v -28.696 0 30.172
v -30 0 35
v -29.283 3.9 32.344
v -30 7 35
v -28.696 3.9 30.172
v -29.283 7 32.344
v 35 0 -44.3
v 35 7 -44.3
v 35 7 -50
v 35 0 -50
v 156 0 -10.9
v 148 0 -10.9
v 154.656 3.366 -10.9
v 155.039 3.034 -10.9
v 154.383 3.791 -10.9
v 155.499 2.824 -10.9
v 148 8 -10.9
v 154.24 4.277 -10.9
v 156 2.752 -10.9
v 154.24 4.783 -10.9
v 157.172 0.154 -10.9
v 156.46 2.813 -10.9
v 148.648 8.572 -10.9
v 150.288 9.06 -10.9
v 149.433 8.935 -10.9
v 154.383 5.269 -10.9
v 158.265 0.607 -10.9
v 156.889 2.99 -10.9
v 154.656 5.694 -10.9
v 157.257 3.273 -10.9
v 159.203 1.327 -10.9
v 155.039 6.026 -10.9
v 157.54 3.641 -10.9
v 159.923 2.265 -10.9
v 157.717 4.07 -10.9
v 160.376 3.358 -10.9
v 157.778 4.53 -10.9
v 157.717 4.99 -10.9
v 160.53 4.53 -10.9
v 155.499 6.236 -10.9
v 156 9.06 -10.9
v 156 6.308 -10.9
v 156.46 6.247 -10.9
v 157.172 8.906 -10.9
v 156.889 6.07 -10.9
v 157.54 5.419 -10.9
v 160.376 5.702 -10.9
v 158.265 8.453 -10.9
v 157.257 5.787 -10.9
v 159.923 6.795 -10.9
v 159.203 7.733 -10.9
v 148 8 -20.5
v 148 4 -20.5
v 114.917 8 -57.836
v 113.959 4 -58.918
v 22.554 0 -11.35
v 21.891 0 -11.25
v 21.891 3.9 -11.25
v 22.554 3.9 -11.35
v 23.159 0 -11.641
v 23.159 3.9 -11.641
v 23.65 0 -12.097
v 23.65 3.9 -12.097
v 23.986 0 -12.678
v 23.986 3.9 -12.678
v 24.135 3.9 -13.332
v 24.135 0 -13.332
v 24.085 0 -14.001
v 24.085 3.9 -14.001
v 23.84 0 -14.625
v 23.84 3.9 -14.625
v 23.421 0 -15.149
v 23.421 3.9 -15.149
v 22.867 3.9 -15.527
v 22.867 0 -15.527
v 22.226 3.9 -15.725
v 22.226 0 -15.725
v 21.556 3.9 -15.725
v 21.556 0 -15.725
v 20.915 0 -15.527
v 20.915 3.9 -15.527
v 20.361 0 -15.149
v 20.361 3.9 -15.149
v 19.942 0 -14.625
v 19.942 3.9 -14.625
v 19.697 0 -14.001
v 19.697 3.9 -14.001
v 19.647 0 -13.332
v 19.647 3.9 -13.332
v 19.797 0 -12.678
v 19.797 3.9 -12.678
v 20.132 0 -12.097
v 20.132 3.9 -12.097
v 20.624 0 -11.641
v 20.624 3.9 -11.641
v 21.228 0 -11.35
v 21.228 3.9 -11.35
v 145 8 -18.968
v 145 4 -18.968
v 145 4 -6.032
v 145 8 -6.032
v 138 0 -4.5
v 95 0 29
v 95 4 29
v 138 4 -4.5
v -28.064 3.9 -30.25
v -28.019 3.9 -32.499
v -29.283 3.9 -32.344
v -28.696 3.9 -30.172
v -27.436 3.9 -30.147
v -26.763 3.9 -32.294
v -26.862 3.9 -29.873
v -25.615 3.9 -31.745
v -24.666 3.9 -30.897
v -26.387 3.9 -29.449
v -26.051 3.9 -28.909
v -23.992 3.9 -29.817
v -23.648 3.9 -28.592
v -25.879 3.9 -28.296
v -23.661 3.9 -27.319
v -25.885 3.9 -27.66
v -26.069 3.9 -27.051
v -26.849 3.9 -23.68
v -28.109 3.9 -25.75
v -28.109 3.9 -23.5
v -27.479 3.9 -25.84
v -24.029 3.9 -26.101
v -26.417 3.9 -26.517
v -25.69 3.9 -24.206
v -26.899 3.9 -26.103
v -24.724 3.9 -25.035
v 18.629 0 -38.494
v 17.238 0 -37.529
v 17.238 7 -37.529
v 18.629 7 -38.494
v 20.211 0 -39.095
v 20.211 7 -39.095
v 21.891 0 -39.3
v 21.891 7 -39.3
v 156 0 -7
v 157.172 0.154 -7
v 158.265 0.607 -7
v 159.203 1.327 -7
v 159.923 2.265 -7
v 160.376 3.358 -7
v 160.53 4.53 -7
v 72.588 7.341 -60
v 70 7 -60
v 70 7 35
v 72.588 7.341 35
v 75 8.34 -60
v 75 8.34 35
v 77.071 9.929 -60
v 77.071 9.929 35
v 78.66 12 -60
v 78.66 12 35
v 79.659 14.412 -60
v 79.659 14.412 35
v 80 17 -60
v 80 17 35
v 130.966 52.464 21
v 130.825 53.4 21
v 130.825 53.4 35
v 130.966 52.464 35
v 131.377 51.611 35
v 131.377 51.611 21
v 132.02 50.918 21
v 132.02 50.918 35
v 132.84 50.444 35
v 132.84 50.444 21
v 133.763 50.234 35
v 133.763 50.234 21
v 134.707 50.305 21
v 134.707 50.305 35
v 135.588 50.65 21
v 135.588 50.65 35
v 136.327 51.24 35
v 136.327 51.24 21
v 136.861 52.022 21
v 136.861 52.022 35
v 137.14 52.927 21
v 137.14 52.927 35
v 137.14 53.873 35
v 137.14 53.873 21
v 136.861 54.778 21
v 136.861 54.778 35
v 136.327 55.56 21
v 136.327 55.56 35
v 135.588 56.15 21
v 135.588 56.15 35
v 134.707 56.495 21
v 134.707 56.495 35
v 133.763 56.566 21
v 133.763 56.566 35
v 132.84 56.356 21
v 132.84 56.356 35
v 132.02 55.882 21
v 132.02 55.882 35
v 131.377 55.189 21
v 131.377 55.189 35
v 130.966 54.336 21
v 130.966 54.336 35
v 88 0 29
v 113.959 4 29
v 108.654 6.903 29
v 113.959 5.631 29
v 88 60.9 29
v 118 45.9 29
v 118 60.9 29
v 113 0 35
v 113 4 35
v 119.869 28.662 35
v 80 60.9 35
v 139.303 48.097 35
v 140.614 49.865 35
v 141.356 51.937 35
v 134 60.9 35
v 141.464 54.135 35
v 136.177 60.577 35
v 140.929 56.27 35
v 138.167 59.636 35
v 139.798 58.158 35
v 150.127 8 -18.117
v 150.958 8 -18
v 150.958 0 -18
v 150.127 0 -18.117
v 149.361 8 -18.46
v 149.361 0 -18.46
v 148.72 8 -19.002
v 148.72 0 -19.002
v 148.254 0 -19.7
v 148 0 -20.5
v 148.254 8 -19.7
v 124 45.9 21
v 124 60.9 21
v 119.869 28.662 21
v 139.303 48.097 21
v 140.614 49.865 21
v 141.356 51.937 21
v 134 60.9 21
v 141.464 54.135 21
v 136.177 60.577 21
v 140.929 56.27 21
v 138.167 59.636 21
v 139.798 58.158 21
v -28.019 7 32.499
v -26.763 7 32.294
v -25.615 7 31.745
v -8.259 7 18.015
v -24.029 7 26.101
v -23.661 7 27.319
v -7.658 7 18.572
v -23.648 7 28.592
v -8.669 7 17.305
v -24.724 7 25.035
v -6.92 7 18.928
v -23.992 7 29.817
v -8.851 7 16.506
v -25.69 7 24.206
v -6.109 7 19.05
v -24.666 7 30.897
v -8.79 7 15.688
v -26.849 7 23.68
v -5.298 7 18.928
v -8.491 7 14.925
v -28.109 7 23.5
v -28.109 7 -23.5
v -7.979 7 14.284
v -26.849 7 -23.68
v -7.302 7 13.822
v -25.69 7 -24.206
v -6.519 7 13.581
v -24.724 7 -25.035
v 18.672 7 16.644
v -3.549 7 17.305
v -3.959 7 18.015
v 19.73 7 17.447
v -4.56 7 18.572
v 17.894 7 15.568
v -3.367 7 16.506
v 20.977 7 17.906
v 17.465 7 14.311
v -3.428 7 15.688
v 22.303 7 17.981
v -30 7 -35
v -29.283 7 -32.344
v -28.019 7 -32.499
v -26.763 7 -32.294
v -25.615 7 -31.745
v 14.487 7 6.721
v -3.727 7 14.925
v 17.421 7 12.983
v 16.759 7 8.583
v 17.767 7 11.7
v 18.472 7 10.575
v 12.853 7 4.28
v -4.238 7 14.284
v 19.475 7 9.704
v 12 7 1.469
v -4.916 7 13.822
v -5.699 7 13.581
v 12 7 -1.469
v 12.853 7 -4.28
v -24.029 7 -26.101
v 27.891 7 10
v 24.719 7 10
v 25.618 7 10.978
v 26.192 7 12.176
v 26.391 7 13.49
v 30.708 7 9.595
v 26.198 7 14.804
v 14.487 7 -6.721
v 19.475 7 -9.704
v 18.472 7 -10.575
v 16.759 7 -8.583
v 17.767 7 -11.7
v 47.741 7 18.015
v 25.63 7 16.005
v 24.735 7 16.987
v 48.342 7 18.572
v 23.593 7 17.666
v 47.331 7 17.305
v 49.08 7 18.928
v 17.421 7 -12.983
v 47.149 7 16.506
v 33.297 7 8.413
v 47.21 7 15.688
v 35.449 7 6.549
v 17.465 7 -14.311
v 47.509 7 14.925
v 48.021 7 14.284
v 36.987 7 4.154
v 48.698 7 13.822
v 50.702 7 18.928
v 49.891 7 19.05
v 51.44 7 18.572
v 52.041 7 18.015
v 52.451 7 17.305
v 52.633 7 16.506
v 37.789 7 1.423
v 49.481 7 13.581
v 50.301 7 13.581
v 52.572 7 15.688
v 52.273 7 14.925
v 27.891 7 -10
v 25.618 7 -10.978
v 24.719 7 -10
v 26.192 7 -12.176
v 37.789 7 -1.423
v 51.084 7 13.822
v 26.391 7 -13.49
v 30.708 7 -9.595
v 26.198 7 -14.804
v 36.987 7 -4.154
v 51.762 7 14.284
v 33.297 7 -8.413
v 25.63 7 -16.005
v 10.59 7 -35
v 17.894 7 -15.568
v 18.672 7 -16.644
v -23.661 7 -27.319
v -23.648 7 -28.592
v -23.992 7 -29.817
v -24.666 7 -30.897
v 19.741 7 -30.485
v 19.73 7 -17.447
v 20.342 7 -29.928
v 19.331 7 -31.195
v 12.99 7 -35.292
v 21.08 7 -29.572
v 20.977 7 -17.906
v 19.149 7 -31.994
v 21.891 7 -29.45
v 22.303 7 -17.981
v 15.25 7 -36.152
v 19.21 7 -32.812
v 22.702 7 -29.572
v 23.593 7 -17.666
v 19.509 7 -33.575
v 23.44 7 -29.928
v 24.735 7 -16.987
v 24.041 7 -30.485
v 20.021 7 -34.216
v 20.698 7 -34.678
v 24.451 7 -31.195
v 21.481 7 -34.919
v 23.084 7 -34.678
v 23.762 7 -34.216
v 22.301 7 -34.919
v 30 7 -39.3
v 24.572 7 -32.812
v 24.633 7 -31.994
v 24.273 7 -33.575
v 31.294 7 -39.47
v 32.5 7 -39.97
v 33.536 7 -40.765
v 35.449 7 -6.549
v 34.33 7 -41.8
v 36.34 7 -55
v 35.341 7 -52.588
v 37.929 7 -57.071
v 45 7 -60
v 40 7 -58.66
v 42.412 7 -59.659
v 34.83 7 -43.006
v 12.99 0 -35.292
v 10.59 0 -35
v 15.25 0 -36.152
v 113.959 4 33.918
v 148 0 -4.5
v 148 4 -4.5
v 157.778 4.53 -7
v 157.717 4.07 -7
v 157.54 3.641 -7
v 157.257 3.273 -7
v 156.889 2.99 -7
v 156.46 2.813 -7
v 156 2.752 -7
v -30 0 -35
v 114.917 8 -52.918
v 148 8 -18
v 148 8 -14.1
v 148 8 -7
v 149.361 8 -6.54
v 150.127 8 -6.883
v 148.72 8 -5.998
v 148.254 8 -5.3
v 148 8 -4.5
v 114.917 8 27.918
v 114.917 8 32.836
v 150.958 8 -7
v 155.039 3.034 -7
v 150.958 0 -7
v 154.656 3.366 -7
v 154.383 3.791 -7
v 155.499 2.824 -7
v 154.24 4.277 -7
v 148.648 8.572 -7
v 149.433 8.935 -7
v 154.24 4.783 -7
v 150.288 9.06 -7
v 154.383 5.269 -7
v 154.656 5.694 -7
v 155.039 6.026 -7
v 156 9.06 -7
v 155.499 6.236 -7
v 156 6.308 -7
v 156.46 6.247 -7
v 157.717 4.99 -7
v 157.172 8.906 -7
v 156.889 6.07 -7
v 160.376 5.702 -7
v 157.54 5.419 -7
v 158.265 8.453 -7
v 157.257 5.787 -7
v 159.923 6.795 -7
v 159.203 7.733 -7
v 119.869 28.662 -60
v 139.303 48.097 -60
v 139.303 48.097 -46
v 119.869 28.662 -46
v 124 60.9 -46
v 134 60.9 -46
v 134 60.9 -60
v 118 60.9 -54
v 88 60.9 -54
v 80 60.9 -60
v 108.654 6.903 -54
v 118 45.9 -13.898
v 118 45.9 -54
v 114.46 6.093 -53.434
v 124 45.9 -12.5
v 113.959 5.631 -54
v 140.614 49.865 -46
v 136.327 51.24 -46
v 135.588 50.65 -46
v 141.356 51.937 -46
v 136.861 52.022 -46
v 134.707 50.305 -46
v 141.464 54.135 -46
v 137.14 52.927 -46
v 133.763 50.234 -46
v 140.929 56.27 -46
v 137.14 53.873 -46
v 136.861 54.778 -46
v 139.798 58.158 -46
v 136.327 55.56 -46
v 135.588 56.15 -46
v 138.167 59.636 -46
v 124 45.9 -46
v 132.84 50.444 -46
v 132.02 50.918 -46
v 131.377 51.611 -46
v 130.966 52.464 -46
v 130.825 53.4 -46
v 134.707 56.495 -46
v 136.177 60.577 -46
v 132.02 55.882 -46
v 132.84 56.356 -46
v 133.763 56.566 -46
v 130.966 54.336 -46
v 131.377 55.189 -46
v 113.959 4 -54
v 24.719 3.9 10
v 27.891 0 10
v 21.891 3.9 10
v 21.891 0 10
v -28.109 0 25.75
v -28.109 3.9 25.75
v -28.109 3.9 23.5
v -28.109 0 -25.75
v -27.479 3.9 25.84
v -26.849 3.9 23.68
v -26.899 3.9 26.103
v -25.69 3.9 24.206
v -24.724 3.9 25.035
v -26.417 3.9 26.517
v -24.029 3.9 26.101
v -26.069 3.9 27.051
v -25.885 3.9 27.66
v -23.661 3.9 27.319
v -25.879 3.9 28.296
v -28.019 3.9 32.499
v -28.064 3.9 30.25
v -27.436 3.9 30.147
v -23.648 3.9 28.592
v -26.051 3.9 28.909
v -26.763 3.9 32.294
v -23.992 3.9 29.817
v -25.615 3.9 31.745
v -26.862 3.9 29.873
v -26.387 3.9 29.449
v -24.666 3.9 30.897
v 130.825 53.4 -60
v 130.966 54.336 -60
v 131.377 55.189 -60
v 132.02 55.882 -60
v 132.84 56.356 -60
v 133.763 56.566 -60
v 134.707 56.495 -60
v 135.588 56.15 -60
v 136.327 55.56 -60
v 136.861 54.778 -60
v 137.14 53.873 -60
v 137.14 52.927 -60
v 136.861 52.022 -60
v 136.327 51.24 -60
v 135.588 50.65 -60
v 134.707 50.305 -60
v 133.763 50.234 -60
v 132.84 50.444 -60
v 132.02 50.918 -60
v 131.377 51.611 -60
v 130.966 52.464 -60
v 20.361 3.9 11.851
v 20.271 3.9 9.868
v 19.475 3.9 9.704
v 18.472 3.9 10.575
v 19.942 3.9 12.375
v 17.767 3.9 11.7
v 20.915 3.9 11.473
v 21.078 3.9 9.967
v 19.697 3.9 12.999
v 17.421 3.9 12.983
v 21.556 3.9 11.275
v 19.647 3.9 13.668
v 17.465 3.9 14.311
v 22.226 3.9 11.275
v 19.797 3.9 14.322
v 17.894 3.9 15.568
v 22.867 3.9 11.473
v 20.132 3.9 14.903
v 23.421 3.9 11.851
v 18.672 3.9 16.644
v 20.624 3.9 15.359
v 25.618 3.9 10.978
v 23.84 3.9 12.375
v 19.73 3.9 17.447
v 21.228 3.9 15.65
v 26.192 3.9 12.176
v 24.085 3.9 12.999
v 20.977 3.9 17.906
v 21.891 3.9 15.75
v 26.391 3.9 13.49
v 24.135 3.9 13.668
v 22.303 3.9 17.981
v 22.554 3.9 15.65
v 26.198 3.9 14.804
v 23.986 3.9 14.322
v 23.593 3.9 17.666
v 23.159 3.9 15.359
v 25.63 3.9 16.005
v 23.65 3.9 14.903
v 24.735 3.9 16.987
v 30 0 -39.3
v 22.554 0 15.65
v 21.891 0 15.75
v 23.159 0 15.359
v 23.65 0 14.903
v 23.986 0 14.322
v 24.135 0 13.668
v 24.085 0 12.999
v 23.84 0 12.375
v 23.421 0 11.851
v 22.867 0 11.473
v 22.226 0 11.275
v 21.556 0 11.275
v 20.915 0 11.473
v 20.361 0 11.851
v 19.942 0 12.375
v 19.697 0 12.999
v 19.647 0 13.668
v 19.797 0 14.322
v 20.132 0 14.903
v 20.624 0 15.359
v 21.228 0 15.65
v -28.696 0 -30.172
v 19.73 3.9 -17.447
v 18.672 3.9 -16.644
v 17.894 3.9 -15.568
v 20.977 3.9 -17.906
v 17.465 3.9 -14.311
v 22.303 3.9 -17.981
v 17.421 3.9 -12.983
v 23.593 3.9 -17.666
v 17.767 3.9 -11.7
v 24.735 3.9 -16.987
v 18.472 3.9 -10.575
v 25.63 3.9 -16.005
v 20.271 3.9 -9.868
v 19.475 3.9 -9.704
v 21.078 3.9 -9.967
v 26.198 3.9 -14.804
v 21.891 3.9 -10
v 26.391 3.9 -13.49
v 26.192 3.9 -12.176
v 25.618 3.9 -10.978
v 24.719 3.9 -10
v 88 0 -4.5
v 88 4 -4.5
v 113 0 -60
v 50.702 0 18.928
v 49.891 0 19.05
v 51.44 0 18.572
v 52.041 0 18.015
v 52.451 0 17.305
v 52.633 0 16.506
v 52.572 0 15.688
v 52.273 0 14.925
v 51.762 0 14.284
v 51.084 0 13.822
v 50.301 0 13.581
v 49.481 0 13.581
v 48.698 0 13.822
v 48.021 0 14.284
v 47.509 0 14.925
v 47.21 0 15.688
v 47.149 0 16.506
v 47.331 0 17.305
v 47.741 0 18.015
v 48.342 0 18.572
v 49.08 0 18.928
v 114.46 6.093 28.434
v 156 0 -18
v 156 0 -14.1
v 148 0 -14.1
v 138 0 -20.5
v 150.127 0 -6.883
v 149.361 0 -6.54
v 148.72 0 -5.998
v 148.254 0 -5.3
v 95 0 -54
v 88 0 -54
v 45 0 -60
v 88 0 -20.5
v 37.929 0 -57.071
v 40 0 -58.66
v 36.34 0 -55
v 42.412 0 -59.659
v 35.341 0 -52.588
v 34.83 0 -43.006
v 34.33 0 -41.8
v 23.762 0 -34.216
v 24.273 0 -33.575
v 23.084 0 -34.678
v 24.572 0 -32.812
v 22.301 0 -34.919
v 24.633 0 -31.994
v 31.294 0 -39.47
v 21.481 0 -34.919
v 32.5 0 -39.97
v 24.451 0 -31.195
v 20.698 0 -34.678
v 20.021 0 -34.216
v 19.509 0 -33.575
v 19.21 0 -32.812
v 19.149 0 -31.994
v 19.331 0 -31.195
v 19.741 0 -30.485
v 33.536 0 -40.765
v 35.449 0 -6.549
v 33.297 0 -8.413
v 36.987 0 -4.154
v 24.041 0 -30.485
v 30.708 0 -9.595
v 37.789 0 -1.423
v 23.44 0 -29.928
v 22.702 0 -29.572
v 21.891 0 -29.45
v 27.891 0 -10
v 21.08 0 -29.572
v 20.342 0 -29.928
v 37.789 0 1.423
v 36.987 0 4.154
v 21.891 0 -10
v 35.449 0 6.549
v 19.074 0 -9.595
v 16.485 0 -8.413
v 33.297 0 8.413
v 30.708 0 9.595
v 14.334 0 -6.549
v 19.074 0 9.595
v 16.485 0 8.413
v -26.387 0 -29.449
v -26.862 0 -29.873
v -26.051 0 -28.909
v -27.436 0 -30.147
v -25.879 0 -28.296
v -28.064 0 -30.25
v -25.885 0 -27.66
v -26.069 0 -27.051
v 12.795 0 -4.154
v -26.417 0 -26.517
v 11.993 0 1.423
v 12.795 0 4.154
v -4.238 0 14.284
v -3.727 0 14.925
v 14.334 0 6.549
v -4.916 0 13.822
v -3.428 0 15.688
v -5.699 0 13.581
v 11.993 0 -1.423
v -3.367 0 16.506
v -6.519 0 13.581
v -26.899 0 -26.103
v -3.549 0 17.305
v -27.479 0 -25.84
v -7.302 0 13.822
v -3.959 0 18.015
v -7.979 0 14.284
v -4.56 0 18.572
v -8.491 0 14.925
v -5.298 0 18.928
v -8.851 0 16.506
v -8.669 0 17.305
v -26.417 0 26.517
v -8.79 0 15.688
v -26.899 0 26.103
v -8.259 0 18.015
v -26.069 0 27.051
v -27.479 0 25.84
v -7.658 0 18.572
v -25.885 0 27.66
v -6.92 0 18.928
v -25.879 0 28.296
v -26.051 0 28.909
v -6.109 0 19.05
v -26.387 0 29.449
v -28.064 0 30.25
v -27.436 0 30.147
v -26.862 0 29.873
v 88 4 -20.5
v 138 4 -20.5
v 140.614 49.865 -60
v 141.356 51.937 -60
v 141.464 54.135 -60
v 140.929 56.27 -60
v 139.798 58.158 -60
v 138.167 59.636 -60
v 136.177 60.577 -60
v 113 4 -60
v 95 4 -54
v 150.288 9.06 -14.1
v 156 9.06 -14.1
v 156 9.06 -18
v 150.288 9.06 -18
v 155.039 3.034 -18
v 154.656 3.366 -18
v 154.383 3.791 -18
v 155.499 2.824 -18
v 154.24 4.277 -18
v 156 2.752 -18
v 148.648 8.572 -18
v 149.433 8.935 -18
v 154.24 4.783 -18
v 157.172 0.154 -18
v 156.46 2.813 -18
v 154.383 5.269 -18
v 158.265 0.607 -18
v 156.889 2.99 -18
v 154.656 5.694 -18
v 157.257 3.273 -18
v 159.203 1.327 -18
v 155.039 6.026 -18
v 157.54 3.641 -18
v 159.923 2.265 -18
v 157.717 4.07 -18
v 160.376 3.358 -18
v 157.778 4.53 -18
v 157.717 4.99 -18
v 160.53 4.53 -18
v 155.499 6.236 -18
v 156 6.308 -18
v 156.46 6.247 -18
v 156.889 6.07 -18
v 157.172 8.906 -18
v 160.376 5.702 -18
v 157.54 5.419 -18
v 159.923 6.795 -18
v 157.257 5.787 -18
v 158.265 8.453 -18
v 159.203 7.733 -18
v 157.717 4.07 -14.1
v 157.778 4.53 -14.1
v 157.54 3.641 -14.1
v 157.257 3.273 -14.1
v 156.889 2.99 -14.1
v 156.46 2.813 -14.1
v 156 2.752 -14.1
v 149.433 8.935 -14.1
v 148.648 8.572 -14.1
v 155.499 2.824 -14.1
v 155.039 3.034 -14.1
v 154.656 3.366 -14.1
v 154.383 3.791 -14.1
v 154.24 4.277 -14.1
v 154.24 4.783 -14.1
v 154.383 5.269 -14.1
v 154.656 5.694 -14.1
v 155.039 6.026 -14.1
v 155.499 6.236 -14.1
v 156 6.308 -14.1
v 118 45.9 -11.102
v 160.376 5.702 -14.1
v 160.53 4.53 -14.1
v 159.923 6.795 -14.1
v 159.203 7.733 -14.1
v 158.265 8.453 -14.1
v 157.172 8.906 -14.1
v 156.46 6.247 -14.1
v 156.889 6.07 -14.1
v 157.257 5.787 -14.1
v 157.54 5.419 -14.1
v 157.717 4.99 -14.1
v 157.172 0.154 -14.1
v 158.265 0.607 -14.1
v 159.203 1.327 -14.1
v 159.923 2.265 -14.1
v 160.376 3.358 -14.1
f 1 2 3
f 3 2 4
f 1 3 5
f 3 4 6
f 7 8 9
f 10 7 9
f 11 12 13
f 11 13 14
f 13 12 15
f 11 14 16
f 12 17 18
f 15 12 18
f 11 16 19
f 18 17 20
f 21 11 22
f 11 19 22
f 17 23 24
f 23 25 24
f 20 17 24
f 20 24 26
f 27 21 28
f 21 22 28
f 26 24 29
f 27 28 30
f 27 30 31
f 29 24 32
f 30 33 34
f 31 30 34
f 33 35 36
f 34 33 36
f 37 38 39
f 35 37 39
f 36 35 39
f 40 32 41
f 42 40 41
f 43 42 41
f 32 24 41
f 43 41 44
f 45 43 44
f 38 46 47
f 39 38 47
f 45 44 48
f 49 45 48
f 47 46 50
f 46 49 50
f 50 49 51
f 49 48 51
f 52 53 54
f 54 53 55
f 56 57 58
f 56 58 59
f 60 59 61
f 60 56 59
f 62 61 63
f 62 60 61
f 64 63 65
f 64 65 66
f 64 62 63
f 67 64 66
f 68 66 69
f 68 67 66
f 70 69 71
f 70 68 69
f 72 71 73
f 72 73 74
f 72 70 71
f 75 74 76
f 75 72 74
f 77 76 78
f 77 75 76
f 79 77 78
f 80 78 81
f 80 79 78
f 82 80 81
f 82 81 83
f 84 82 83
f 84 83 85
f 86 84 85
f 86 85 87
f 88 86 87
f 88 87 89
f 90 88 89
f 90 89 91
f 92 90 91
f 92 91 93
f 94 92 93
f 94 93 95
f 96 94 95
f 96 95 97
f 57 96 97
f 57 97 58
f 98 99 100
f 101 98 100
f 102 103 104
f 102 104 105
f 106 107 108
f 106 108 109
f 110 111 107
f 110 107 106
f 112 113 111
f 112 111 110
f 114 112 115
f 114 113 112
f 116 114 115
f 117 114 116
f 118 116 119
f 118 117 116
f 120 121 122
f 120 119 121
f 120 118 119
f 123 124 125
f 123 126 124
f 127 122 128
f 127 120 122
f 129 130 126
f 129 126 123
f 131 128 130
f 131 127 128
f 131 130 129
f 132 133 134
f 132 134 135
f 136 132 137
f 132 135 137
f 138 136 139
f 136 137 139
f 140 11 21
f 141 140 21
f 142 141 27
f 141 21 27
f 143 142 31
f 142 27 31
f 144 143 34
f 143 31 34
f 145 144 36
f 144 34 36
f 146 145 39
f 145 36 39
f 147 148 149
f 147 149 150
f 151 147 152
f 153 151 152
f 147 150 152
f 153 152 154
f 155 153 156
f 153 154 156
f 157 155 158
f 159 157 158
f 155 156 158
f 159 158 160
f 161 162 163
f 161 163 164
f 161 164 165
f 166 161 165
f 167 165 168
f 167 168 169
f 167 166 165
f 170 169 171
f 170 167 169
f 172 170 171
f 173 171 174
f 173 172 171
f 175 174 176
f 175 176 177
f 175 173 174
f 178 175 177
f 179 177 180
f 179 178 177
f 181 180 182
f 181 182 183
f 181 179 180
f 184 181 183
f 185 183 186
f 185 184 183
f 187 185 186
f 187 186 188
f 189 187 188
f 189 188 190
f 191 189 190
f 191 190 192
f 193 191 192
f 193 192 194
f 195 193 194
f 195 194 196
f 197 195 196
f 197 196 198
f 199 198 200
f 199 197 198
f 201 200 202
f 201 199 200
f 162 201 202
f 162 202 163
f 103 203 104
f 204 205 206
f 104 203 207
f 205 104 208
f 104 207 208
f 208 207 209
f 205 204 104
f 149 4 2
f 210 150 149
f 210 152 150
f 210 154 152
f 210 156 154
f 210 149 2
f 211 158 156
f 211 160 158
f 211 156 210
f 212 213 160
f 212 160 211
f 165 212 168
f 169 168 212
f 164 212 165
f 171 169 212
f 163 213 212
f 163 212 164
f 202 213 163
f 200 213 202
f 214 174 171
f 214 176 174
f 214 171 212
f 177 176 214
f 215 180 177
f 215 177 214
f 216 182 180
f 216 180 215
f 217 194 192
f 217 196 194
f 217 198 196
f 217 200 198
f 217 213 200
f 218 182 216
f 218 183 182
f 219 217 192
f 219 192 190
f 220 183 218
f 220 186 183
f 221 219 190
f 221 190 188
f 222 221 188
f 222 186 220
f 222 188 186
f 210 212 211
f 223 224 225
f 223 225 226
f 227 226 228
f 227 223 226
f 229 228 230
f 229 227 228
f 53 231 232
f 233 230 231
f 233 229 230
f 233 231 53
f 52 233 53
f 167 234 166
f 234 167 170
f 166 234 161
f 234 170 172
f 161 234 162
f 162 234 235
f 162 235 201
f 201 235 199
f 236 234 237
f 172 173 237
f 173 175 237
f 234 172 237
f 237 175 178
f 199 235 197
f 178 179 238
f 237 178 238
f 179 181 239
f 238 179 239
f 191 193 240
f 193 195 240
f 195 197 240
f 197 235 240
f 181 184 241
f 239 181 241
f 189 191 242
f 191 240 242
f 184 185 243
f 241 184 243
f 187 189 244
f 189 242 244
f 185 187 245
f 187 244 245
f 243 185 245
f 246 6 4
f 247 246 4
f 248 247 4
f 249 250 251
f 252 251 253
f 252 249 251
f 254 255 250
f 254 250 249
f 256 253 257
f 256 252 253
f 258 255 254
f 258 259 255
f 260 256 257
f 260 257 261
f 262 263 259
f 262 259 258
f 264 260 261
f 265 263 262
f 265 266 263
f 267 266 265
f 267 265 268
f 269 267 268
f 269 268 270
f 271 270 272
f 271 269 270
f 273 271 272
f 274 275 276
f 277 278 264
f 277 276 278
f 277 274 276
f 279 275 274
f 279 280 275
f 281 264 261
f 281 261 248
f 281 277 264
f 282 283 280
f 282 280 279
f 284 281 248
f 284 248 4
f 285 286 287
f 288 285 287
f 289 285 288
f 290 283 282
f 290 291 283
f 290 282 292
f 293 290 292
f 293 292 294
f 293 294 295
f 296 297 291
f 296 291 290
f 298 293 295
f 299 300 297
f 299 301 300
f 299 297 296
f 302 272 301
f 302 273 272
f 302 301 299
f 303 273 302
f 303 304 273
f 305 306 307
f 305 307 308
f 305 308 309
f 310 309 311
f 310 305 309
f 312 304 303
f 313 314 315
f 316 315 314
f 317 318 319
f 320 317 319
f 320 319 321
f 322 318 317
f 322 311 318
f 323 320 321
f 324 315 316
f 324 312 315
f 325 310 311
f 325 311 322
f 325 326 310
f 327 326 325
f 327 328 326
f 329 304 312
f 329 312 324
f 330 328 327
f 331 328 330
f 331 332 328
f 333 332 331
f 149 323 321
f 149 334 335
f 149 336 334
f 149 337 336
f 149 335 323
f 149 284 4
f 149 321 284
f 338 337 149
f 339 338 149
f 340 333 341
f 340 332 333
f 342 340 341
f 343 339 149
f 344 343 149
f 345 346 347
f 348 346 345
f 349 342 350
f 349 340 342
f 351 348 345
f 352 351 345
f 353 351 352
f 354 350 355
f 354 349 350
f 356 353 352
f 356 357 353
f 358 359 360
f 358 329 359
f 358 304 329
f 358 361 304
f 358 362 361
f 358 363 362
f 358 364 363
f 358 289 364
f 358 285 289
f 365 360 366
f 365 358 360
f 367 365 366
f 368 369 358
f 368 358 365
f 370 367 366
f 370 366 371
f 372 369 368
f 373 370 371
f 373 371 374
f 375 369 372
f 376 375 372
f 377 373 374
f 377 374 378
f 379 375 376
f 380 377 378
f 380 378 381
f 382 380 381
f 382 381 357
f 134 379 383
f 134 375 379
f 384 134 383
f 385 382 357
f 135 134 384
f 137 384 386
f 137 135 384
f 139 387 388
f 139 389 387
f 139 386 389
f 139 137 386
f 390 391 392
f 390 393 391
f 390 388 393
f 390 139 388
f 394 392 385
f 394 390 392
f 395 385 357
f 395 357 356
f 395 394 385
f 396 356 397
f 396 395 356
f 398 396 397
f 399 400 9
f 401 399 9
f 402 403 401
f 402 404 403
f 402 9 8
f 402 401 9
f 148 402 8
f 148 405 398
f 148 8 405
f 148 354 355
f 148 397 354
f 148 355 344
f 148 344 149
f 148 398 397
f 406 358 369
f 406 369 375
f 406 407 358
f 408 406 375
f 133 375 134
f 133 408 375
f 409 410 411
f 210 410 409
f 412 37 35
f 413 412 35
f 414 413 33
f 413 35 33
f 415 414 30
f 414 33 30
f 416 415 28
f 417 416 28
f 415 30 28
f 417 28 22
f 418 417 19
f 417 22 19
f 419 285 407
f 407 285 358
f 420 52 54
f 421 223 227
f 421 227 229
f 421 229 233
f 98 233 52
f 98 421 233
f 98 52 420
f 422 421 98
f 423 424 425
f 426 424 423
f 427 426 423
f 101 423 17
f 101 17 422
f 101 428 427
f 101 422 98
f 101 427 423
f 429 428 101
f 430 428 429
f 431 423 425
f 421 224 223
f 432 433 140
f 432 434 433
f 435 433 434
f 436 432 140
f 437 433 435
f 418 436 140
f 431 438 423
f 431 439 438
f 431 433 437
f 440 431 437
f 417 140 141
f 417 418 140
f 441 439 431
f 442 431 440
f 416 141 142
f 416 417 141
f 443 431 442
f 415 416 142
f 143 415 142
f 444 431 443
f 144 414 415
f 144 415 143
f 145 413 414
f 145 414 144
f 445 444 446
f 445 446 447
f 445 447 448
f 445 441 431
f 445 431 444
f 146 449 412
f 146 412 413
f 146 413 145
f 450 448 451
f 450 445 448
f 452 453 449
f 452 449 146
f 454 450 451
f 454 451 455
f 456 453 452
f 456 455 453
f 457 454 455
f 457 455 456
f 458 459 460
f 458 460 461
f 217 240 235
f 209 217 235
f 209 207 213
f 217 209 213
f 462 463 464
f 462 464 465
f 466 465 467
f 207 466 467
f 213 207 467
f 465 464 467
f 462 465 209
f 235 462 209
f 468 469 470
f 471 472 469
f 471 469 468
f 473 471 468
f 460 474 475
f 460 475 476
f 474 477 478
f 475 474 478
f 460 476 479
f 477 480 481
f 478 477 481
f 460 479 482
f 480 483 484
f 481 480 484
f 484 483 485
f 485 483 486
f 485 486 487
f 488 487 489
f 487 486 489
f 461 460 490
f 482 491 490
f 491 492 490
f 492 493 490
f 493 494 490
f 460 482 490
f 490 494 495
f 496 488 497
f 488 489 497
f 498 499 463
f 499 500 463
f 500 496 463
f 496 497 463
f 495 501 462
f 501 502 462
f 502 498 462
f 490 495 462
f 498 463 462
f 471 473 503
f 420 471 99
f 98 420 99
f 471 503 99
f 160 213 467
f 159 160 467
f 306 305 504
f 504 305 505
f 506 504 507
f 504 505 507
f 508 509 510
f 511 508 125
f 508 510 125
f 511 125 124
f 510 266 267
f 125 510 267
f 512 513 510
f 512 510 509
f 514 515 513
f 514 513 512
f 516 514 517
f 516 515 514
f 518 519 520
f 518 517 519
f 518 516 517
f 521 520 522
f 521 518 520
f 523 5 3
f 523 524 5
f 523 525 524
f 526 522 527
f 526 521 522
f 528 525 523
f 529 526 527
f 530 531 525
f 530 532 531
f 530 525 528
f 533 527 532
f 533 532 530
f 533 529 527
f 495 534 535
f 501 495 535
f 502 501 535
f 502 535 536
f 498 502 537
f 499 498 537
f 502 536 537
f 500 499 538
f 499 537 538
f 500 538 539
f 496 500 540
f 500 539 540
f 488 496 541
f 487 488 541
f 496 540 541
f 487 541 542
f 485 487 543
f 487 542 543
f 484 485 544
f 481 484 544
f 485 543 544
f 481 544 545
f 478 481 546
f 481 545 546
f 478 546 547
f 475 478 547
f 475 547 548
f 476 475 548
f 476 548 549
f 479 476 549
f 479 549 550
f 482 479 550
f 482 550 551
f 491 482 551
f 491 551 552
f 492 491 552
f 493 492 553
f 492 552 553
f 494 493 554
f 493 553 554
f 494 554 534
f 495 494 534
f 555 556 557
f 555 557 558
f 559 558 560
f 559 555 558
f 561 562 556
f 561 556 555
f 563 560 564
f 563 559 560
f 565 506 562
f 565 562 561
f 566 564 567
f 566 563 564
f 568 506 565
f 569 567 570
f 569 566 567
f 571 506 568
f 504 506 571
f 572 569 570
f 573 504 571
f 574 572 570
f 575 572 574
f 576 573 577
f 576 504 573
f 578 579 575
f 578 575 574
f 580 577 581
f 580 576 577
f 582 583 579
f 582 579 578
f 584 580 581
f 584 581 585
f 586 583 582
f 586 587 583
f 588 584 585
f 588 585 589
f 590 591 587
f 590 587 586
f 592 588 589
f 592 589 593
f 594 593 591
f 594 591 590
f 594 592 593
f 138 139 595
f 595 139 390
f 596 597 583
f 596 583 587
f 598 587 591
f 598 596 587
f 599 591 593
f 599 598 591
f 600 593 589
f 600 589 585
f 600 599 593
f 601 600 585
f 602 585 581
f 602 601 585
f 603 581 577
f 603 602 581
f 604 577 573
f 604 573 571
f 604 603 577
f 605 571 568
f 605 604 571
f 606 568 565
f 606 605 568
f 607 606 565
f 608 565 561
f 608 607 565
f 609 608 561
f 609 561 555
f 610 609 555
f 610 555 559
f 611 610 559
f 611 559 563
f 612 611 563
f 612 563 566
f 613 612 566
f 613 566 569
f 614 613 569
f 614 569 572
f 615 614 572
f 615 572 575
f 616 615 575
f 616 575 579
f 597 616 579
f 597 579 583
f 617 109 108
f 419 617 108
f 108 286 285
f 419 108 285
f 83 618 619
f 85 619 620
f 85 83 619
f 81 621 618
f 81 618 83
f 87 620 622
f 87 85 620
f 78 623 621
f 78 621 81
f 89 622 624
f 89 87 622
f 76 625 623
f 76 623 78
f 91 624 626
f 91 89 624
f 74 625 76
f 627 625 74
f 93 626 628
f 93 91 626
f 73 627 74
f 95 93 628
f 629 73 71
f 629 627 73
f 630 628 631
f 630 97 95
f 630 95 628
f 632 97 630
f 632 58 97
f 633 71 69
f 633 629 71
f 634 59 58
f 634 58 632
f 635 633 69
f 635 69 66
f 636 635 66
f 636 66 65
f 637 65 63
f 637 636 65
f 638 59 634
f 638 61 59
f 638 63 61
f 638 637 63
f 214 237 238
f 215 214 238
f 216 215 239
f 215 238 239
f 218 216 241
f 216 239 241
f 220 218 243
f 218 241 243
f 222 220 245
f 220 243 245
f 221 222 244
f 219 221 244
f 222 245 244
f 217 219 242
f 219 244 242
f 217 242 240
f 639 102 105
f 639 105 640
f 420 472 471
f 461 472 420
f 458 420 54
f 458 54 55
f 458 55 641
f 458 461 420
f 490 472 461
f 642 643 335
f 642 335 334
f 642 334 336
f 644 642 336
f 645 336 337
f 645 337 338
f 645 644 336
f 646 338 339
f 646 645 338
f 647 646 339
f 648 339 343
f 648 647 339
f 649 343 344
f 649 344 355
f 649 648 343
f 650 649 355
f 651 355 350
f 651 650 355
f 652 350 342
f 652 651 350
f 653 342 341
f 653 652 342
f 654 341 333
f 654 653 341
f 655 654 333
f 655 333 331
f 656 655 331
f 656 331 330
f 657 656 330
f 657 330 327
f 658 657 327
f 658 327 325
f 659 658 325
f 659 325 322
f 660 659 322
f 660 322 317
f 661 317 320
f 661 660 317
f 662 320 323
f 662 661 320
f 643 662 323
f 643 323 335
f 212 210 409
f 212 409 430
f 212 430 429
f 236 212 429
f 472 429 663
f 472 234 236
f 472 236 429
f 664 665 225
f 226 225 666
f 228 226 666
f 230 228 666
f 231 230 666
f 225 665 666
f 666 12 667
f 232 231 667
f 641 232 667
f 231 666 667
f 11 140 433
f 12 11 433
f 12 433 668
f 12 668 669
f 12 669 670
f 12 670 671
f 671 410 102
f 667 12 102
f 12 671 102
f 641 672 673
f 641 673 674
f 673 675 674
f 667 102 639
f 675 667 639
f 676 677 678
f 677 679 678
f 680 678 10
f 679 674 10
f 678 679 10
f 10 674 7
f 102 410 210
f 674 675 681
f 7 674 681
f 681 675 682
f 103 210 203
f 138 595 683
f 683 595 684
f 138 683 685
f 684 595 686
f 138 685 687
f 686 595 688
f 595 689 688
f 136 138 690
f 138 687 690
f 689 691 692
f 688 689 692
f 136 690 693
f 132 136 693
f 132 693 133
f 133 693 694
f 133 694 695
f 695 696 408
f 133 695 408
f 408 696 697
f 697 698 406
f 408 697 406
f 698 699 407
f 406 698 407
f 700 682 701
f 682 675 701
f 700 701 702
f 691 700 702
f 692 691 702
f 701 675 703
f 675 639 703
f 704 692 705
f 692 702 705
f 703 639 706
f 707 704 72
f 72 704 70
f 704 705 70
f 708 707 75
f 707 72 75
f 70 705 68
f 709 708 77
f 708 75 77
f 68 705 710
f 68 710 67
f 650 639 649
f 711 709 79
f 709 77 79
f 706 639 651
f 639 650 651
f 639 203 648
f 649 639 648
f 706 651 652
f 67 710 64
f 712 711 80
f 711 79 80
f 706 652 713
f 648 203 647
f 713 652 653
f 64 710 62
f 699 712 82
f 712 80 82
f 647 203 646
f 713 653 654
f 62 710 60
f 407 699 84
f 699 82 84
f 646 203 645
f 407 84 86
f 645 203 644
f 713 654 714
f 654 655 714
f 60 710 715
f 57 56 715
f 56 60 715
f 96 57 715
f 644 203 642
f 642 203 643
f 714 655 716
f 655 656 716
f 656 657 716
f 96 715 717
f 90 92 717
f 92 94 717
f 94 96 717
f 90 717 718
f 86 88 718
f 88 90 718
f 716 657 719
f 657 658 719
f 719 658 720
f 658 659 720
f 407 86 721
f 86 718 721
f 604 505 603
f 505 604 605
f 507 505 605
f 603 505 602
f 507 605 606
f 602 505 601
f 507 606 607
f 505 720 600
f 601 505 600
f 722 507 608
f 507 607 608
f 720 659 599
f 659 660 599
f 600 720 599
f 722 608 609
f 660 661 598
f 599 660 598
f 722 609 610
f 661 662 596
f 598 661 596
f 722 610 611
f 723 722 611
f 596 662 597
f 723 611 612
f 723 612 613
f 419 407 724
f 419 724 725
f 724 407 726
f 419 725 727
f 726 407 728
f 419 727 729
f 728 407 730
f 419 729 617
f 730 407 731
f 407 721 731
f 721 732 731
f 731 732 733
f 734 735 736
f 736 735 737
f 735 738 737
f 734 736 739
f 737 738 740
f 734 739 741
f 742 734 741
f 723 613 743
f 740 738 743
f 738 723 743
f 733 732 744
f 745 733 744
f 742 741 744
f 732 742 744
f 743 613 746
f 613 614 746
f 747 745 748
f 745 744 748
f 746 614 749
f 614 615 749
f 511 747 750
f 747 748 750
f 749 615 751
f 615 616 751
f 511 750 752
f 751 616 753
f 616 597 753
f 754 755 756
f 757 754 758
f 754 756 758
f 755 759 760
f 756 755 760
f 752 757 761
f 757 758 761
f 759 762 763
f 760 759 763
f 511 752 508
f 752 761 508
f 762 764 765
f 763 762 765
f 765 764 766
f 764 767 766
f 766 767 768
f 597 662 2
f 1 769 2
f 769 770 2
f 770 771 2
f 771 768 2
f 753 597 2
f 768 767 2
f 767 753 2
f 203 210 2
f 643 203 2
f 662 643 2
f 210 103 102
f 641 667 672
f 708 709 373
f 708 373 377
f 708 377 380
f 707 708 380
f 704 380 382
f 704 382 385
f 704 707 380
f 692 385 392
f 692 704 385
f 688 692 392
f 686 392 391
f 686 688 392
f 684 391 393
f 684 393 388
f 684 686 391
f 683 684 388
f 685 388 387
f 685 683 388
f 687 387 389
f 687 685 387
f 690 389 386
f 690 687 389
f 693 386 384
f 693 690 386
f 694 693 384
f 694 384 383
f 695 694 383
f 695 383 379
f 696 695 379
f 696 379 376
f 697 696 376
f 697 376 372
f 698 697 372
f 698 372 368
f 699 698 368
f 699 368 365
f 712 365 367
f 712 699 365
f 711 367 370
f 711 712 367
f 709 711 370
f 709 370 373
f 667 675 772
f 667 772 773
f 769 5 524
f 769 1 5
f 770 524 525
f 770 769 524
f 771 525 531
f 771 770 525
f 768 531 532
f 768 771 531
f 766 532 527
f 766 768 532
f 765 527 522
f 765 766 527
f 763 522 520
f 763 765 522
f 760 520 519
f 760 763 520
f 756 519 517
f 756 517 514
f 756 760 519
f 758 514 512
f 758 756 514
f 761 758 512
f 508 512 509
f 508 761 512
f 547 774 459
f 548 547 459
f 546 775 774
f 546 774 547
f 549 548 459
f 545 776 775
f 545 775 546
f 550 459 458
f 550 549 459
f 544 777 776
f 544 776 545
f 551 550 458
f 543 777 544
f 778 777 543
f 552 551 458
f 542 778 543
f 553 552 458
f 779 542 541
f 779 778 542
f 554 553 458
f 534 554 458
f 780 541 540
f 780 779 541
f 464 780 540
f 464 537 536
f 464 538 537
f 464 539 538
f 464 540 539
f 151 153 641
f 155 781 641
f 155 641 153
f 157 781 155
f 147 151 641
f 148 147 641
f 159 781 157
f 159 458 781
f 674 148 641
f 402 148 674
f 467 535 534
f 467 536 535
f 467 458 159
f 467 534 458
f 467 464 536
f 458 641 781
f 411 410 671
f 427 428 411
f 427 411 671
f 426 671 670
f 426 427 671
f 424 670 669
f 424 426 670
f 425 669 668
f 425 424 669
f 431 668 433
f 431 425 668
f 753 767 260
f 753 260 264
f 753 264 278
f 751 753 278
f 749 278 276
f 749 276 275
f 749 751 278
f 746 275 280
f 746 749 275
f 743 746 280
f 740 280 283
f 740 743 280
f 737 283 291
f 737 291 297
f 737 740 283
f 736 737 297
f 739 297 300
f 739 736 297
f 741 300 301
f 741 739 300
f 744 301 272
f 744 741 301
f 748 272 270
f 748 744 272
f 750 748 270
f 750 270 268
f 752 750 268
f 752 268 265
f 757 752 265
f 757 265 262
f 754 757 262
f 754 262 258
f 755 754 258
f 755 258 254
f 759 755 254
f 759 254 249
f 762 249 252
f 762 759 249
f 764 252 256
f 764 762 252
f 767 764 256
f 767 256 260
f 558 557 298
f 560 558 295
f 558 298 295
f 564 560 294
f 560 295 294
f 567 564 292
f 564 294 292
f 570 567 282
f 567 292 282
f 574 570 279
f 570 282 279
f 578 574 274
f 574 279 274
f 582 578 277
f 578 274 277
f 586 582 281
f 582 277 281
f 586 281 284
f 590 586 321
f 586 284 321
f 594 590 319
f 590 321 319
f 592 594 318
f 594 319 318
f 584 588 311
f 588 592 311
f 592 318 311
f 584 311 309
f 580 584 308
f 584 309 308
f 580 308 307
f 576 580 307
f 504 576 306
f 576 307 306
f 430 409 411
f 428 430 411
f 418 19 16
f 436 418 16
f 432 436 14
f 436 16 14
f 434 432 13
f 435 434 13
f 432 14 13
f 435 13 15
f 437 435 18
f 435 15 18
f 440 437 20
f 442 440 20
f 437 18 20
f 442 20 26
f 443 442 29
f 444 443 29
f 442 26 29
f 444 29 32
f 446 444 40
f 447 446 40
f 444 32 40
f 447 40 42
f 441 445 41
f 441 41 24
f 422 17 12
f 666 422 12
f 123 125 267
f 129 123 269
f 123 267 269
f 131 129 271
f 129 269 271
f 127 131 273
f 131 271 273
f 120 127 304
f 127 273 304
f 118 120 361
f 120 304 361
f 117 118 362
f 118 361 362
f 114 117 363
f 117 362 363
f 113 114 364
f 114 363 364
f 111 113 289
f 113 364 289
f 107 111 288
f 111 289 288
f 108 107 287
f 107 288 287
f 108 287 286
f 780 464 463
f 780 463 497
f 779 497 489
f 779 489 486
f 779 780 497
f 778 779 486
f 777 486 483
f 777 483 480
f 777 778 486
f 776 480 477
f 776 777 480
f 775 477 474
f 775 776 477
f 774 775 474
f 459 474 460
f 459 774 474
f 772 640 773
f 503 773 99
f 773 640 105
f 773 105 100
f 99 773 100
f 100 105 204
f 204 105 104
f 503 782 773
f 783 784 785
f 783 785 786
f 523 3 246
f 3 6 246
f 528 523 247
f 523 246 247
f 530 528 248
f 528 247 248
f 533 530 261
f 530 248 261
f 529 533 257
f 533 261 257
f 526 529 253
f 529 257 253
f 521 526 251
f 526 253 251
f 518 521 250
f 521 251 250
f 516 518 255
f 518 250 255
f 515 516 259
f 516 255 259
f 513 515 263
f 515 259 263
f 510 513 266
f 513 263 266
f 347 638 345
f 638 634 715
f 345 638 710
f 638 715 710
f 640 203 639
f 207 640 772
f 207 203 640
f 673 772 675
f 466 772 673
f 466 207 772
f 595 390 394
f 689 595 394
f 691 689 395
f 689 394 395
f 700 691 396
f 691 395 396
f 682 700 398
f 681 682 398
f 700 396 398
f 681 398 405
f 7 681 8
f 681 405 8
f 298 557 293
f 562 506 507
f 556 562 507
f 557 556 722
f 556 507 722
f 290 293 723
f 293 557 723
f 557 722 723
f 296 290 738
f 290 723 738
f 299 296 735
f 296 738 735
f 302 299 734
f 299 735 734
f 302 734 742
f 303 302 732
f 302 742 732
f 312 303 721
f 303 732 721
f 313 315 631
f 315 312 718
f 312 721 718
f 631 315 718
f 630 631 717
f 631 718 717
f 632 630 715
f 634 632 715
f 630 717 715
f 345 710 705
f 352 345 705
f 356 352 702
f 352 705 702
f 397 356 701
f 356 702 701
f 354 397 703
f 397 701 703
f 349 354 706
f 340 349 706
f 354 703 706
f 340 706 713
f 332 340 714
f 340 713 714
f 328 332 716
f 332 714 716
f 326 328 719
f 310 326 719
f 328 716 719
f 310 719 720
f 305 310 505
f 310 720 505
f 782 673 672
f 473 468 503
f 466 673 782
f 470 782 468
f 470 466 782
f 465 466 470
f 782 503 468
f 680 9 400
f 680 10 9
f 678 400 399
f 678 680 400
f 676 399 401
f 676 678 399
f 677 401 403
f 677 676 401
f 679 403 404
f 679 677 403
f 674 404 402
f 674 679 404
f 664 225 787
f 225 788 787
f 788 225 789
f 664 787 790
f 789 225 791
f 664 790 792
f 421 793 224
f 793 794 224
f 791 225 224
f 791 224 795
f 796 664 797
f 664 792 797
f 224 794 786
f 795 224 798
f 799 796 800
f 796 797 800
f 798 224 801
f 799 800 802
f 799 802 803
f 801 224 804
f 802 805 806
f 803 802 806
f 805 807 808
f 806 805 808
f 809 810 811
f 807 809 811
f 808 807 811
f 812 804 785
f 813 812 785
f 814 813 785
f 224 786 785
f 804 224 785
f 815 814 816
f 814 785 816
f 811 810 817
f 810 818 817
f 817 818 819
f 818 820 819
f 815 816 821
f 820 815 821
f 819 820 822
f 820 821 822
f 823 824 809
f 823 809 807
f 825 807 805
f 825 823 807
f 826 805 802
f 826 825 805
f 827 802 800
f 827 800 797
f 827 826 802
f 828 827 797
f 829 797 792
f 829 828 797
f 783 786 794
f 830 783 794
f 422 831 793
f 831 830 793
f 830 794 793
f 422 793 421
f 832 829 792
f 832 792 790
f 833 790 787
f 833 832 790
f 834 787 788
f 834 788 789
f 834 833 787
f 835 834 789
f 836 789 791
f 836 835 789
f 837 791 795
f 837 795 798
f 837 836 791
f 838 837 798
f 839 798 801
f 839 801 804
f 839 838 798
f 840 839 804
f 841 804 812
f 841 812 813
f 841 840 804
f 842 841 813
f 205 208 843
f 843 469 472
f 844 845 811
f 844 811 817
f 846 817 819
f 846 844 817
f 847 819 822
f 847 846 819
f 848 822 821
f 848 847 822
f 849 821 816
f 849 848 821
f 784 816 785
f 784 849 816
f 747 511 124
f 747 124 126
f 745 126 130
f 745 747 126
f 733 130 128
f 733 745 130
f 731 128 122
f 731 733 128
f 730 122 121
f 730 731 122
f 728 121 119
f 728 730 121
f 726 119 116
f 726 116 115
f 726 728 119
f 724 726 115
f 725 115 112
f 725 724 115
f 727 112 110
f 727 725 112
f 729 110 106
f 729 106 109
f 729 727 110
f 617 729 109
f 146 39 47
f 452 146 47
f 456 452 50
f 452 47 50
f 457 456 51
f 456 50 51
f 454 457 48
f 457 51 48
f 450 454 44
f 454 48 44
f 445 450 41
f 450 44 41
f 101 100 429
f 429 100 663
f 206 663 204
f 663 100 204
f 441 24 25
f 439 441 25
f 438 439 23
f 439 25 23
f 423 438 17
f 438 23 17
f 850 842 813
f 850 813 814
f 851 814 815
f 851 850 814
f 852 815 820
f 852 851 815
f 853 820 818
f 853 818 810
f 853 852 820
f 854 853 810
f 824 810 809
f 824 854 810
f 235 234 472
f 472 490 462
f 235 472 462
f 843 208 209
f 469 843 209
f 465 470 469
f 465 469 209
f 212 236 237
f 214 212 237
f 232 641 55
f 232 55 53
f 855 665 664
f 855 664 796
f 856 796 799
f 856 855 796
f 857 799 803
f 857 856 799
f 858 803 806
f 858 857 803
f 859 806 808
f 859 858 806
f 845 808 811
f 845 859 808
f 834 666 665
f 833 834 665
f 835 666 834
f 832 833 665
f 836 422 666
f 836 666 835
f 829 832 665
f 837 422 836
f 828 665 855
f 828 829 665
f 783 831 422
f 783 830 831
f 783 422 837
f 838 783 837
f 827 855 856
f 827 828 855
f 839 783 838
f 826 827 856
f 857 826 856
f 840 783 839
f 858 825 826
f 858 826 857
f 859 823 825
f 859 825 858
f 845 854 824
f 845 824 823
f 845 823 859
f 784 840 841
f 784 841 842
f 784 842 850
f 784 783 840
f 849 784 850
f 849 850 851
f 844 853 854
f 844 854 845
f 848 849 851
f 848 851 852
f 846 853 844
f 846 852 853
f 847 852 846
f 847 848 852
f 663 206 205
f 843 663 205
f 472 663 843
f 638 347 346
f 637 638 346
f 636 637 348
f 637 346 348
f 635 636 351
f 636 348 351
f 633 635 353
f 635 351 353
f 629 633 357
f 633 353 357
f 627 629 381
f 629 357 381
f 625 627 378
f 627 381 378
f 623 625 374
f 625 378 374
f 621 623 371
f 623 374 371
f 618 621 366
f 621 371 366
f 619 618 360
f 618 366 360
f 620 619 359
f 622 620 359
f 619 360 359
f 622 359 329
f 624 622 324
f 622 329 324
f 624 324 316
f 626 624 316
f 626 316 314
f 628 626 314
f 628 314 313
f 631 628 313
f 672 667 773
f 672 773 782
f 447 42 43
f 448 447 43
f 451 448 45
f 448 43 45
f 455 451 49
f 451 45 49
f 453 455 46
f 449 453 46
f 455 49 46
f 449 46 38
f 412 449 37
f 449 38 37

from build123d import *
from build123d.topology import SkipClean

# Parameters (mm, degrees)
SKETCH1_W                                        = 115
SKETCH1_H                                        = 95
EXTRUDE1_DEPTH                                   = 7
SKETCH2_R                                        = 2.75
SKETCH2_R_2                                      = 2.25
EXTRUDE7_DEPTH                                   = 7
CBORE_FOR_M4_PAN_HEAD_MACHINE_SCREW2_D           = 4.5
CBORE_FOR_M4_PAN_HEAD_MACHINE_SCREW2_CBORE_D     = 9
CBORE_FOR_M4_PAN_HEAD_MACHINE_SCREW2_CBORE_DEPTH = 3.1
EXTRUDE9_DEPTH                                   = 101.244700608
FILLET1_R                                        = 10
SKETCH19_W                                       = 95
SKETCH19_H                                       = 60.9
BOSS_EXTRUDE1_DEPTH                              = 8
BOSS_EXTRUDE2_DEPTH                              = 6
BOSS_EXTRUDE3_DEPTH                              = 6
SKETCH22_W                                       = 6
SKETCH22_H                                       = 15
BOSS_EXTRUDE4_DEPTH                              = 83
BOSS_EXTRUDE5_DEPTH                              = 5.834785
SKETCH25_R                                       = 3.175
BOSS_EXTRUDE6_DEPTH                              = 14
BOSS_EXTRUDE7_START                              = -14
SKETCH26_R                                       = 3.175
BOSS_EXTRUDE7_DEPTH                              = 14
FILLET2_R                                        = 10
BOSS_EXTRUDE8_DEPTH                              = 4
BOSS_EXTRUDE9_DEPTH                              = 4
BOSS_EXTRUDE10_DEPTH                             = 5.5
CUT_EXTRUDE1_DEPTH                               = 1.6
FILLET3_R                                        = 3


with BuildPart() as part:
    # Sketch1 → Extrude1 (new body)
    with BuildSketch(Plane(origin=(0, 0, 0), x_dir=(1, 0, 0), z_dir=(0, 1, 0))):
        with Locations((22.5, 12.5)):
            Rectangle(SKETCH1_W, SKETCH1_H)
    extrude(amount=EXTRUDE1_DEPTH)

    # Sketch2 → Extrude7 (cut)
    with BuildSketch(Plane(origin=(0, 0, 0), x_dir=(1, 0, 0), z_dir=(0, 1, 0))):
        with Locations(Location((-6.108955811, -16.3, 0), (0, 0, 270))):
            Circle(SKETCH2_R)
        with Locations(Location((49.891044189, -16.3, 0), (0, 0, 270))):
            Circle(SKETCH2_R)
        with Locations(Location((-28.108955811, -28, 0), (0, 0, 270))):
            Circle(SKETCH2_R_2)
        with Locations(Location((-28.108955811, 28, 0), (0, 0, 270))):
            Circle(SKETCH2_R_2)
        with Locations(Location((21.891044189, 32.2, 0), (0, 0, 270))):
            Circle(SKETCH2_R)
        with Locations(Location((21.891044189, -13.5, 0), (0, 0, 270))):
            Circle(SKETCH2_R_2)
        with Locations(Location((21.891044189, 13.5, 0), (0, 0, 270))):
            Circle(SKETCH2_R_2)
        with BuildLine():
            Line((21.891044189, 10), (27.891044189, 10))
            ThreePointArc((27.891044189, 10), (37.891044189, 0), (27.891044189, -10))
            Line((27.891044189, -10), (21.891044189, -10))
            ThreePointArc((21.891044189, -10), (11.891044189, 0), (21.891044189, 10))
        make_face()
    extrude(amount=EXTRUDE7_DEPTH, mode=Mode.SUBTRACT)

    # CBORE for M4 Pan Head Machine Screw2 (through all)
    with Locations(Plane(origin=(-28.108955811, 7, -28), x_dir=(0, 0, 1), z_dir=(0, 1, 0))):
        with Locations((0, 0), (14.5, 50), (41.5, 50), (56, 0)):
            CounterBoreHole(CBORE_FOR_M4_PAN_HEAD_MACHINE_SCREW2_D / 2, CBORE_FOR_M4_PAN_HEAD_MACHINE_SCREW2_CBORE_D / 2, CBORE_FOR_M4_PAN_HEAD_MACHINE_SCREW2_CBORE_DEPTH)

    # Sketch18 → Extrude9 (cut, through all)
    with BuildSketch(Plane(origin=(0, 7, 0), x_dir=(1, 0, 0), z_dir=(0, 1, 0))):
        with BuildLine():
            Line((21.891044189, 39.300103485), (30, 39.300103485))
            ThreePointArc((30, 39.300103485), (33.535533906, 40.764569579), (35, 44.300103485))
            Line((35, 44.300103485), (35, 60))
            Line((35, 60), (-35, 60))
            Line((-35, 60), (-35, 35))
            Line((-35, 35), (-35, -35))
            Line((-35, -35), (-30, -35))
            Line((-30, -35), (-28.108955811, -28))
            Line((-28.108955811, -28), (-28.108955811, 28))
            Line((-28.108955811, 28), (-30, 35))
            Line((-30, 35), (15.43267297, 35))
            ThreePointArc((15.43267297, 35), (18.01156456, 38.126735256), (21.891044189, 39.300103485))
        make_face()
    extrude(amount=-EXTRUDE9_DEPTH, mode=Mode.SUBTRACT)

    # Fillet1
    fillet1_edges = [part.edges().sort_by_distance(p)[0] for p in [
        (15.43267297, 3.5, -35),
        (35, 3.5, -60),
    ]]
    fillet(fillet1_edges, radius=FILLET1_R)

    # Sketch19 → Boss-Extrude1 (add)
    with BuildSketch(Plane(origin=(80, 0, 0), x_dir=(0, 0, -1), z_dir=(1, 0, 0))):
        with Locations((12.5, 30.45)):
            Rectangle(SKETCH19_W, SKETCH19_H)
    extrude(amount=BOSS_EXTRUDE1_DEPTH)

    # Sketch20 → Boss-Extrude2 (add)
    with BuildSketch(Plane(origin=(0, 0, -60), x_dir=(-1, 0, 0), z_dir=(0, 0, -1))):
        Polygon((-88, 0), (-113, 0), (-124, 45.9), (-124, 60.9), (-88, 60.9), (-80, 60.9), (-80, 7), (-45, 7), (-45, 0), align=None)
    extrude(amount=-BOSS_EXTRUDE2_DEPTH)

    # Sketch21 → Boss-Extrude3 (add)
    with BuildSketch(Plane.XY.offset(35)):
        Polygon((88, 60.9), (88, 0), (113, 0), (124, 45.9), (124, 60.9), align=None)
    extrude(amount=-BOSS_EXTRUDE3_DEPTH)

    # Sketch22 → Boss-Extrude4 (add)
    with BuildSketch(Plane.XY.offset(-54)):
        with Locations((121, 53.4)):
            Rectangle(SKETCH22_W, SKETCH22_H)
    extrude(amount=BOSS_EXTRUDE4_DEPTH)

    # Sketch23 → Boss-Extrude5 (add)
    with BuildSketch(Plane(origin=(106.862582536, -25.609769235, 0), x_dir=(0, 0, -1), z_dir=(0.9724641747215814, -0.2330524165999433, 0))):
        Polygon((12.5, 73.534605278), (54, 32.034605278), (54, 73.534605278), align=None)
        Polygon((-29, 32.034605278), (12.5, 73.534605278), (-29, 73.534605278), align=None)
    extrude(amount=-BOSS_EXTRUDE5_DEPTH)

    # Sketch25 → Boss-Extrude6 (add)
    # profile 1 of 2: a face of its own
    with BuildSketch(Plane(origin=(0, 0, -60), x_dir=(-1, 0, 0), z_dir=(0, 0, -1))):
        with BuildLine():
            Line((-124, 60.9), (-134, 60.9))
            ThreePointArc((-134, 60.9), (-141.5, 53.4), (-134, 45.9))
            Line((-134, 45.9), (-124, 45.9))
            Line((-124, 45.9), (-124, 60.9))
        make_face()
        with Locations((-134, 53.4)):
            Circle(SKETCH25_R, mode=Mode.SUBTRACT)
    # profile 2 of 2: a face of its own
    with BuildSketch(Plane(origin=(0, 0, -60), x_dir=(-1, 0, 0), z_dir=(0, 0, -1))):
        with BuildLine():
            Line((-119.868979401, 28.662377683), (-124, 45.9))
            Line((-124, 45.9), (-134, 45.9))
            ThreePointArc((-134, 45.9), (-136.870125743, 46.470903506), (-139.303300859, 48.096699141))
            Line((-139.303300859, 48.096699141), (-119.868979401, 28.662377683))
        make_face()
    extrude(amount=-BOSS_EXTRUDE6_DEPTH)

    # Sketch26 → Boss-Extrude7 (add)
    with BuildSketch(Plane.XY.offset(35).offset(BOSS_EXTRUDE7_START)):
        with BuildLine():
            Line((134, 60.9), (124, 60.9))
            Line((124, 60.9), (124, 45.9))
            Line((124, 45.9), (119.868979401, 28.662377683))
            Line((119.868979401, 28.662377683), (139.303300859, 48.096699141))
            ThreePointArc((139.303300859, 48.096699141), (140.929096494, 56.270125743), (134, 60.9))
        make_face()
        with Locations(Location((134, 53.4, 0), (0, 0, 180))):
            Circle(SKETCH26_R, mode=Mode.SUBTRACT)
    extrude(amount=BOSS_EXTRUDE7_DEPTH)

    # Fillet2
    fillet2_edges = [part.edges().sort_by_distance(p)[0] for p in [
        (80, 7, -12.5),
    ]]
    fillet(fillet2_edges, radius=FILLET2_R)

    # Sketch27 → Boss-Extrude8 (add)
    with BuildSketch(Plane.XZ):
        Polygon((95, 29), (138, -4.5), (148, -4.5), (113, 35), (113, 29), align=None)
        Polygon((138, -4.5), (88, -4.5), (88, -12.5), (148, -12.5), (148, -4.5), align=None)
        Polygon((148, -20.5), (138, -20.5), (95, -54), (113, -54), (113, -60), align=None)
        Polygon((148, -12.5), (88, -12.5), (88, -20.5), (138, -20.5), (148, -20.5), align=None)
    extrude(amount=-BOSS_EXTRUDE8_DEPTH)

    # Sketch28 → Boss-Extrude9 (add)
    with BuildSketch(Plane(origin=(0, 4, 0), x_dir=(1, 0, 0), z_dir=(0, 1, 0))):
        Polygon((148, 20.5), (113.958605664, 58.918145036), (113.958605664, 54), (145, 18.96756925), (145, 6.03243075), (113.958605664, -29), (113.958605664, -33.918145036), (148, 4.5), align=None)
    extrude(amount=BOSS_EXTRUDE9_DEPTH)

    # Sketch29 → Boss-Extrude10 (add, symmetric)
    with SkipClean():  # the faces are left unmerged after this step: merging them gives an invalid solid
        with BuildSketch(Plane.XY.offset(-12.5)):
            with BuildLine():
                ThreePointArc((160.53, 4.53), (159.203193719, 7.733193719), (156, 9.06))
                Line((156, 9.06), (156, 6.308))
                ThreePointArc((156, 6.308), (157.257235857, 5.787235857), (157.778, 4.53))
                ThreePointArc((157.778, 4.53), (157.257235857, 3.272764143), (156, 2.752))
                Line((156, 2.752), (156, 0))
                ThreePointArc((156, 0), (159.203193719, 1.326806281), (160.53, 4.53))
            make_face()
            with BuildLine():
                Line((156, 6.308), (156, 9.06))
                ThreePointArc((156, 9.06), (151.47, 4.53), (156, 0))
                Line((156, 0), (156, 2.752))
                ThreePointArc((156, 2.752), (154.222, 4.53), (156, 6.308))
            make_face()
            with BuildLine():
                Line((156, 9.06), (148, 9.06))
                Line((148, 9.06), (148, 0))
                Line((148, 0), (156, 0))
                ThreePointArc((156, 0), (151.47, 4.53), (156, 9.06))
            make_face()
        extrude(amount=BOSS_EXTRUDE10_DEPTH, both=True)

    # Sketch29<3> → Cut-Extrude1 (cut, symmetric)
    with BuildSketch(Plane.XY.offset(-12.5)):
        with BuildLine():
            Line((156, 9.06), (148, 9.06))
            Line((148, 9.06), (148, 0))
            Line((148, 0), (156, 0))
            ThreePointArc((156, 0), (151.47, 4.53), (156, 9.06))
        make_face()
        with BuildLine():
            ThreePointArc((160.53, 4.53), (159.203193719, 7.733193719), (156, 9.06))
            Line((156, 9.06), (156, 6.308))
            ThreePointArc((156, 6.308), (157.257235857, 5.787235857), (157.778, 4.53))
            ThreePointArc((157.778, 4.53), (157.257235857, 3.272764143), (156, 2.752))
            Line((156, 2.752), (156, 0))
            ThreePointArc((156, 0), (159.203193719, 1.326806281), (160.53, 4.53))
        make_face()
        with BuildLine():
            Line((156, 6.308), (156, 9.06))
            ThreePointArc((156, 9.06), (151.47, 4.53), (156, 0))
            Line((156, 0), (156, 2.752))
            ThreePointArc((156, 2.752), (154.222, 4.53), (156, 6.308))
        make_face()
    extrude(amount=CUT_EXTRUDE1_DEPTH, both=True, mode=Mode.SUBTRACT)

    # Fillet3
    # the kernel refuses this fillet: 3 mm, written as the material it adds along each edge
    with BuildSketch(Plane(origin=(148, 8, -18), x_dir=(0, 0, -1), z_dir=(0, -1, 0))) as fillet3_piece_1:
        with BuildLine():
            CenterArc((3, 2.958039892), FILLET3_R, 180, 80.405931773)
            Line((0, 2.958039892), (0, 0))
            Line((0, 0), (2.5, 0))
        make_face()
    extrude(amount=8)
    with BuildSketch(Plane(origin=(148, 8, -7), x_dir=(1, 0, 0), z_dir=(0, -1, 0))) as fillet3_piece_2:
        with BuildLine():
            CenterArc((2.958039892, 3), FILLET3_R, 189.594068227, 80.405931773)
            Line((0, 2.5), (0, 0))
            Line((0, 0), (2.958039892, 0))
        make_face()
    extrude(amount=8)
    # the kernel refuses this fillet: 3 mm, written as the material it takes off along each edge
    with BuildSketch(Plane(origin=(148, 9.06, -16.620795399), x_dir=(0, -1, 0), z_dir=(0, 0, 1))) as fillet3_2_piece_1:
        with BuildLine():
            CenterArc((3, 2.28831816), FILLET3_R, 180, 49.709248271)
            Line((0, 2.28831816), (0, 0))
            Line((0, 0), (1.06, 0))
        make_face()
    extrude(amount=15.341590798, mode=Mode.SUBTRACT)
    with BuildSketch(Plane(origin=(148, 9.06, -23.720795399), x_dir=(1, 0, 0), z_dir=(0, 0, 1))) as fillet3_2_piece_2:
        with BuildLine():
            CenterArc((2.28831816, -3), FILLET3_R, 90, 49.709248271)
            Line((0, -1.06), (0, 0))
            Line((0, 0), (2.28831816, 0))
        make_face()
    extrude(amount=15.341590798, mode=Mode.SUBTRACT)


solid = part.part
